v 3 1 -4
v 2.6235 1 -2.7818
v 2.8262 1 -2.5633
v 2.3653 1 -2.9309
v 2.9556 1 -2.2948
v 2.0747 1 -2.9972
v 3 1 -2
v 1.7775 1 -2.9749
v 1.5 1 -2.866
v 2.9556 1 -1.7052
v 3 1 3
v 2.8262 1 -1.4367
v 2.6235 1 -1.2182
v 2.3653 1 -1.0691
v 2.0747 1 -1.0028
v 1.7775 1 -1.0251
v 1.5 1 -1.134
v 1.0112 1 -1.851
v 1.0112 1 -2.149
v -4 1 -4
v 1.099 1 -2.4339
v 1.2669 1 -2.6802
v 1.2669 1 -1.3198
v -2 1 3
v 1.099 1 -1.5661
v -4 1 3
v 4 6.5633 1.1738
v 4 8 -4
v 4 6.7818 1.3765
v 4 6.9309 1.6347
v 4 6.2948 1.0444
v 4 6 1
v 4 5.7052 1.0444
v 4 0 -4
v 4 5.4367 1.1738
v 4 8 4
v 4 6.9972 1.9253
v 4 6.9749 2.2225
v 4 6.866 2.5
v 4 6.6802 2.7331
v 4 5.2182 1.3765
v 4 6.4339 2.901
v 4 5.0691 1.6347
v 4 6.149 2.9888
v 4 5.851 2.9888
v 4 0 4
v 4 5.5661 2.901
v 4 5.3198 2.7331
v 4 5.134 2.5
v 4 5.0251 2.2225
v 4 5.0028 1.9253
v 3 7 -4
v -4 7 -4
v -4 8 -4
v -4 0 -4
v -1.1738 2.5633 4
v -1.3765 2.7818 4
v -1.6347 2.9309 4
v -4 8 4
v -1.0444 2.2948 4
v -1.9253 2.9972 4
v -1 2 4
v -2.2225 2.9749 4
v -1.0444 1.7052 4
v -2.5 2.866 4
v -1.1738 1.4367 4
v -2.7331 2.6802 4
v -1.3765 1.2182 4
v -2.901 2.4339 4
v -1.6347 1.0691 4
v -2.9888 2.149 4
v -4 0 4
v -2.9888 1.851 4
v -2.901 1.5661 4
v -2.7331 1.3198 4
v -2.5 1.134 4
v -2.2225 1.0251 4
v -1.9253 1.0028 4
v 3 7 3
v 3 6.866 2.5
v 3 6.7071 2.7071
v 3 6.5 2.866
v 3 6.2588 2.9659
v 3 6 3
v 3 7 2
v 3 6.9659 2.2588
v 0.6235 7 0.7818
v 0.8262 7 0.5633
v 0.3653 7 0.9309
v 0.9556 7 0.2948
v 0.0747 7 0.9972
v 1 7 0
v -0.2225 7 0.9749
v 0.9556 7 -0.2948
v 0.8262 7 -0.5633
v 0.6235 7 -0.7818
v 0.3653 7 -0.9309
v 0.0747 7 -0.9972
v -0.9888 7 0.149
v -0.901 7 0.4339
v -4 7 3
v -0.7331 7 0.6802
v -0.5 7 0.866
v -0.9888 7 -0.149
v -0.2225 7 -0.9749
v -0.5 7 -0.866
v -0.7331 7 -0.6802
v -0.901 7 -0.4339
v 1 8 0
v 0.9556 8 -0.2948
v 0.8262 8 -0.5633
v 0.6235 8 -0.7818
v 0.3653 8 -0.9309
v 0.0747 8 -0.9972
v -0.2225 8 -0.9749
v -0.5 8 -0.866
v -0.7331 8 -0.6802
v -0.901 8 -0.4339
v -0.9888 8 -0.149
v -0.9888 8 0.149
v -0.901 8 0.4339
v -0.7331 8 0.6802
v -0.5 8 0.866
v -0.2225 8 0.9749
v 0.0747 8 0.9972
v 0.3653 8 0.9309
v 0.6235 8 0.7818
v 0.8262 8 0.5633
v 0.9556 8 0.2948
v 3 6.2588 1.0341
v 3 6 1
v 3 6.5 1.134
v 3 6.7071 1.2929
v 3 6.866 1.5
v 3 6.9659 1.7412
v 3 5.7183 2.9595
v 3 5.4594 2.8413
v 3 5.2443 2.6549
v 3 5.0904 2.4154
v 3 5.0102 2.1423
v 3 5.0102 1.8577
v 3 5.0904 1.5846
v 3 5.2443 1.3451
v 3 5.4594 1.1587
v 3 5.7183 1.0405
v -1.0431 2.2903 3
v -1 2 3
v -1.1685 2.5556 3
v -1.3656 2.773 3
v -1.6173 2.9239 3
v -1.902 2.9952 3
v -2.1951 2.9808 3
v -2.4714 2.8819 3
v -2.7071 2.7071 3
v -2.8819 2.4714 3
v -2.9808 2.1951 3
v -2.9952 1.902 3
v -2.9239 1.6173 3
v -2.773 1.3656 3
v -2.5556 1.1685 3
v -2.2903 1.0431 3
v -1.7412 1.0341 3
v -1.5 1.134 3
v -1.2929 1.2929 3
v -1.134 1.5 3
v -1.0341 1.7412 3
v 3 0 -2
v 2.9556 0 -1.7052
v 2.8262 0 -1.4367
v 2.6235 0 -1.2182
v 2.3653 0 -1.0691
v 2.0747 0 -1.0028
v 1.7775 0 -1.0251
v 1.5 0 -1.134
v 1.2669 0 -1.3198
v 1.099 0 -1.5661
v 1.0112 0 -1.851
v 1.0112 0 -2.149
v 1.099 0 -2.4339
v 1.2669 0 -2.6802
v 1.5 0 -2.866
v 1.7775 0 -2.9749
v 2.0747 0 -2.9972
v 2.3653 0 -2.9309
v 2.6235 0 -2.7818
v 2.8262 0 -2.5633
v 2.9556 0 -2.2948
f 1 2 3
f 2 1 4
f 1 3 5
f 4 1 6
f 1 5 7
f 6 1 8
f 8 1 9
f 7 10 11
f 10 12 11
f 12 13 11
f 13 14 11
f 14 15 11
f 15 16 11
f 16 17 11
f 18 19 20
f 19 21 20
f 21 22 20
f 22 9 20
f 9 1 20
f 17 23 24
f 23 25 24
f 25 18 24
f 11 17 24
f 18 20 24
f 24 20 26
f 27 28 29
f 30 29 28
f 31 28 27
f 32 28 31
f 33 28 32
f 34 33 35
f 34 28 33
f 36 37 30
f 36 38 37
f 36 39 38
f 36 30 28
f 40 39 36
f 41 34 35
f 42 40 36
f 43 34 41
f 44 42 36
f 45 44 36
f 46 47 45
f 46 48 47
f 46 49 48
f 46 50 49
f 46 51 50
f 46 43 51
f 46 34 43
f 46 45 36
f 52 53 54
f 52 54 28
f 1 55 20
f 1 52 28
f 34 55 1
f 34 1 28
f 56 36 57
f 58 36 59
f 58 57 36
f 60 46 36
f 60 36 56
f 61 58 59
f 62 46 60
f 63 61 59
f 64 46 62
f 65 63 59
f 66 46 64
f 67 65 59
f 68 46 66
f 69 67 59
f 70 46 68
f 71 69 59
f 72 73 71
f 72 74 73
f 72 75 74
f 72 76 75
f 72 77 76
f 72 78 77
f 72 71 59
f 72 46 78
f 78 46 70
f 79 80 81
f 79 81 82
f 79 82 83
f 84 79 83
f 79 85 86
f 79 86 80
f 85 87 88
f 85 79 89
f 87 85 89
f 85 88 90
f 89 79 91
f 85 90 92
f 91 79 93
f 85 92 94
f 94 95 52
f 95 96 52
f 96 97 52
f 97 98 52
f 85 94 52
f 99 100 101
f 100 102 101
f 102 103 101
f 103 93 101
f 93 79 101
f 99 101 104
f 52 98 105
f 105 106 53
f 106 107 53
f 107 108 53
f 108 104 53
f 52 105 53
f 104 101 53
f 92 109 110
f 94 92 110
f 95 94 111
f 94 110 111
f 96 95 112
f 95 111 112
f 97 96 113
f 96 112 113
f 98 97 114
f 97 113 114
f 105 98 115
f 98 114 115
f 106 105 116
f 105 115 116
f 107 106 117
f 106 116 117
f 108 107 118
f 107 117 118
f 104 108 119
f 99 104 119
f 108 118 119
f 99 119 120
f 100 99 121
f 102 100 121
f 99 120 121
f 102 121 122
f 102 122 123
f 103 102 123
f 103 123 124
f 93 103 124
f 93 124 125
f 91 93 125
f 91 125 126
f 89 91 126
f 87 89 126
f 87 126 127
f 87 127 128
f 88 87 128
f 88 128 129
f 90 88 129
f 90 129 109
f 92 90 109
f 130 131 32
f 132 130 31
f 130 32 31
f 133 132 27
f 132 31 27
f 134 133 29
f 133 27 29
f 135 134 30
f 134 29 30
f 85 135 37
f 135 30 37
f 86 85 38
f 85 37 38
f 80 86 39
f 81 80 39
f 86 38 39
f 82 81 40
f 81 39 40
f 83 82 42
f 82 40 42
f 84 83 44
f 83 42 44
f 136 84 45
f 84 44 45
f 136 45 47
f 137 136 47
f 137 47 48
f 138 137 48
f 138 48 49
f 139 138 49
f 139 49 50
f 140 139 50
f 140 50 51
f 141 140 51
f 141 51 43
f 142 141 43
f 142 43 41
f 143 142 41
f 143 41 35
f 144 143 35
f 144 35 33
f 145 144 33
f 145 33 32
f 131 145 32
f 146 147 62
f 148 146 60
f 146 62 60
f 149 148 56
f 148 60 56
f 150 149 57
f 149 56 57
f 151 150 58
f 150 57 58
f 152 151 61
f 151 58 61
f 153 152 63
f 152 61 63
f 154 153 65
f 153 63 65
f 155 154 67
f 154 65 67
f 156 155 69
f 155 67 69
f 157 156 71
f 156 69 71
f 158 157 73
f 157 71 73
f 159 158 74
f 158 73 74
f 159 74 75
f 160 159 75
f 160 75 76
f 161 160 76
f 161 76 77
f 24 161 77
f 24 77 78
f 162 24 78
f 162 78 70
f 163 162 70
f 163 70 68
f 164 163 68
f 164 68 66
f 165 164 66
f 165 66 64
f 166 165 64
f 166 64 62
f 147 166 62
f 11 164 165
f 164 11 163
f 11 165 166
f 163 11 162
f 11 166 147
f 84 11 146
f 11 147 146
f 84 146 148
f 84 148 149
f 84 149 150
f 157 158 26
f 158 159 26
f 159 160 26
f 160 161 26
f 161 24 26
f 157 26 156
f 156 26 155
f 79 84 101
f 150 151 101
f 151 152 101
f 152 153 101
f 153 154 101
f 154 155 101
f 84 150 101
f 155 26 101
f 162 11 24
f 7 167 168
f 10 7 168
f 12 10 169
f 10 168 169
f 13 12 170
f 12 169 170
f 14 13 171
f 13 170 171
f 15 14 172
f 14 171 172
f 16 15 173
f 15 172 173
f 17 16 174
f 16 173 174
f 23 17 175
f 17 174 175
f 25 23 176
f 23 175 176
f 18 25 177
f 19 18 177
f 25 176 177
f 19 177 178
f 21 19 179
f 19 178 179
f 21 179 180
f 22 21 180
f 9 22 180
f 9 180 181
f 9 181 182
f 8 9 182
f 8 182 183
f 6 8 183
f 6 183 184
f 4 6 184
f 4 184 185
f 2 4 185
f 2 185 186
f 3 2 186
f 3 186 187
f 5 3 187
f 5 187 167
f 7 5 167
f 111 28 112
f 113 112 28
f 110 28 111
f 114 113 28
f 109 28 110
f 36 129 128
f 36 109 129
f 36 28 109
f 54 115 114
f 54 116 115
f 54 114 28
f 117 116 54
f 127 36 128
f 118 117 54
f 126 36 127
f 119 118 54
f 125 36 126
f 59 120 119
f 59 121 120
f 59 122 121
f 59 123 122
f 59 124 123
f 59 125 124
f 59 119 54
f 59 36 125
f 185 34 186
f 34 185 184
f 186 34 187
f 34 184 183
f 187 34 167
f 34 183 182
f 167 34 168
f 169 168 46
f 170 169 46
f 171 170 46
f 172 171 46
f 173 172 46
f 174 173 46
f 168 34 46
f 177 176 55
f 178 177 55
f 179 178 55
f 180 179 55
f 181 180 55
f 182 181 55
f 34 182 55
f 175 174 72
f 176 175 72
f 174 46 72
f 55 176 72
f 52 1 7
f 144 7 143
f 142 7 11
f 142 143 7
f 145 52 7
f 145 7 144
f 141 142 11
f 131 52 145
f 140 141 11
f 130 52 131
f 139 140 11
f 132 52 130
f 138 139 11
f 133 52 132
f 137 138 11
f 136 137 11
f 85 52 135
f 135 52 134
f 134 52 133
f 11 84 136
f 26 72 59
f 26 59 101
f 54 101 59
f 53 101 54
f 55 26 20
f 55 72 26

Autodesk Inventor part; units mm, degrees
ref_plane "YZ Plane" through (0, 0, 0) normal (1, 0, 0) x (0, 1, 0)
ref_plane "XZ Plane" through (0, 0, 0) normal (0, 1, 0) x (-1, 0, 0)
ref_plane "XY Plane" through (0, 0, 0) normal (0, 0, 1) x (1, 0, 0)
sketch "Sketch1" plane through (0, 0, 0) normal (0, 1, 0) x (-1, 0, 0)
  point P0 (0, 0)
sketch "Sketch2" plane through (0, 0, 0) normal (0, 1, 0) x (-1, 0, 0)
  line L0 (-4, 4) -> (4, 4)
  line L1 (4, 4) -> (4, -4)
  line L2 (4, -4) -> (-4, -4)
  line L3 (-4, -4) -> (-4, 4)
  line L4 (-4, 4) -> (4, -4) construction
  line L5 (4, 4) -> (-4, -4) construction
  point P0 (0, 0)
  dimension "d0" = 8
  dimension "d1" = 8
extrude "Extrusion1" add sketch "Sketch2" along normal blind 8
sketch "Sketch3" plane through (-4, 0, -4) normal (-1, 0, 0) x (0, 0, 1)
  line L0 (0, 1) -> (7, 1)
  line L1 (7, 1) -> (7, 7)
  line L2 (7, 7) -> (0, 7)
  line L3 (0, 7) -> (0, 1)
  line L4 (8, 0) -> (0, 0) projected
  line L5 (0, 0) -> (0, 8) projected
  point P0 (4, 0)
  dimension "d4" = 7
  dimension "d5" = 6
  dimension "d6" = 1
  dimension "d7" = 0
extrude "Extrusion2" cut sketch "Sketch3" against normal blind 7
sketch "Sketch4" plane through (-4, 0, 4) normal (0, 0, 1) x (1, 0, 0)
  circle A0 centre (2, 2) radius 1
  line L0 (8, 0) -> (0, 0) projected
  line L1 (8, 0) -> (8, 8) projected
  point P0 (4, 0)
  dimension "d10" = 2
  dimension "d11" = 2
  dimension "d12" = 6
sketch "Sketch5" plane through (4, 0, 4) normal (1, 0, 0) x (0, 0, -1)
  circle A0 centre (2, 6) radius 1
  line L0 (0, 0) -> (0, 8) projected
  line L1 (8, 0) -> (0, 0) projected
  point P0 (4, 0)
  dimension "d13" = 2
  dimension "d14" = 2
  dimension "d15" = 6
sketch "Sketch6" plane through (0, 0, 0) normal (0, -1, 0) x (1, 0, 0)
  circle A0 centre (2, -2) radius 1
  line L0 (4, 4) -> (-4, 4) projected
  line L1 (4, -4) -> (4, 4) projected
  point P0 (0, 0)
  dimension "d16" = 2
  dimension "d17" = 6
  dimension "d18" = 2
extrude "Extrusion3" cut sketch "Sketch6" against normal blind 1
extrude "Extrusion4" cut sketch "Sketch5" against normal blind 1
extrude "Extrusion5" cut sketch "Sketch4" against normal blind 1
sketch "Sketch7" plane through (0, 8, 0) normal (0, 1, 0) x (1, 0, 0)
  circle A0 centre (0, 0) radius 1
  line L0 (4, 4) -> (-4, 4) projected
  line L1 (-4, 4) -> (-4, -4) projected
  dimension "d25" = 2
  dimension "d26" = 4
  dimension "d27" = 4
extrude "Extrusion6" cut sketch "Sketch7" against normal blind 1
properties part number "Corner" material "Aluminum 6061"
